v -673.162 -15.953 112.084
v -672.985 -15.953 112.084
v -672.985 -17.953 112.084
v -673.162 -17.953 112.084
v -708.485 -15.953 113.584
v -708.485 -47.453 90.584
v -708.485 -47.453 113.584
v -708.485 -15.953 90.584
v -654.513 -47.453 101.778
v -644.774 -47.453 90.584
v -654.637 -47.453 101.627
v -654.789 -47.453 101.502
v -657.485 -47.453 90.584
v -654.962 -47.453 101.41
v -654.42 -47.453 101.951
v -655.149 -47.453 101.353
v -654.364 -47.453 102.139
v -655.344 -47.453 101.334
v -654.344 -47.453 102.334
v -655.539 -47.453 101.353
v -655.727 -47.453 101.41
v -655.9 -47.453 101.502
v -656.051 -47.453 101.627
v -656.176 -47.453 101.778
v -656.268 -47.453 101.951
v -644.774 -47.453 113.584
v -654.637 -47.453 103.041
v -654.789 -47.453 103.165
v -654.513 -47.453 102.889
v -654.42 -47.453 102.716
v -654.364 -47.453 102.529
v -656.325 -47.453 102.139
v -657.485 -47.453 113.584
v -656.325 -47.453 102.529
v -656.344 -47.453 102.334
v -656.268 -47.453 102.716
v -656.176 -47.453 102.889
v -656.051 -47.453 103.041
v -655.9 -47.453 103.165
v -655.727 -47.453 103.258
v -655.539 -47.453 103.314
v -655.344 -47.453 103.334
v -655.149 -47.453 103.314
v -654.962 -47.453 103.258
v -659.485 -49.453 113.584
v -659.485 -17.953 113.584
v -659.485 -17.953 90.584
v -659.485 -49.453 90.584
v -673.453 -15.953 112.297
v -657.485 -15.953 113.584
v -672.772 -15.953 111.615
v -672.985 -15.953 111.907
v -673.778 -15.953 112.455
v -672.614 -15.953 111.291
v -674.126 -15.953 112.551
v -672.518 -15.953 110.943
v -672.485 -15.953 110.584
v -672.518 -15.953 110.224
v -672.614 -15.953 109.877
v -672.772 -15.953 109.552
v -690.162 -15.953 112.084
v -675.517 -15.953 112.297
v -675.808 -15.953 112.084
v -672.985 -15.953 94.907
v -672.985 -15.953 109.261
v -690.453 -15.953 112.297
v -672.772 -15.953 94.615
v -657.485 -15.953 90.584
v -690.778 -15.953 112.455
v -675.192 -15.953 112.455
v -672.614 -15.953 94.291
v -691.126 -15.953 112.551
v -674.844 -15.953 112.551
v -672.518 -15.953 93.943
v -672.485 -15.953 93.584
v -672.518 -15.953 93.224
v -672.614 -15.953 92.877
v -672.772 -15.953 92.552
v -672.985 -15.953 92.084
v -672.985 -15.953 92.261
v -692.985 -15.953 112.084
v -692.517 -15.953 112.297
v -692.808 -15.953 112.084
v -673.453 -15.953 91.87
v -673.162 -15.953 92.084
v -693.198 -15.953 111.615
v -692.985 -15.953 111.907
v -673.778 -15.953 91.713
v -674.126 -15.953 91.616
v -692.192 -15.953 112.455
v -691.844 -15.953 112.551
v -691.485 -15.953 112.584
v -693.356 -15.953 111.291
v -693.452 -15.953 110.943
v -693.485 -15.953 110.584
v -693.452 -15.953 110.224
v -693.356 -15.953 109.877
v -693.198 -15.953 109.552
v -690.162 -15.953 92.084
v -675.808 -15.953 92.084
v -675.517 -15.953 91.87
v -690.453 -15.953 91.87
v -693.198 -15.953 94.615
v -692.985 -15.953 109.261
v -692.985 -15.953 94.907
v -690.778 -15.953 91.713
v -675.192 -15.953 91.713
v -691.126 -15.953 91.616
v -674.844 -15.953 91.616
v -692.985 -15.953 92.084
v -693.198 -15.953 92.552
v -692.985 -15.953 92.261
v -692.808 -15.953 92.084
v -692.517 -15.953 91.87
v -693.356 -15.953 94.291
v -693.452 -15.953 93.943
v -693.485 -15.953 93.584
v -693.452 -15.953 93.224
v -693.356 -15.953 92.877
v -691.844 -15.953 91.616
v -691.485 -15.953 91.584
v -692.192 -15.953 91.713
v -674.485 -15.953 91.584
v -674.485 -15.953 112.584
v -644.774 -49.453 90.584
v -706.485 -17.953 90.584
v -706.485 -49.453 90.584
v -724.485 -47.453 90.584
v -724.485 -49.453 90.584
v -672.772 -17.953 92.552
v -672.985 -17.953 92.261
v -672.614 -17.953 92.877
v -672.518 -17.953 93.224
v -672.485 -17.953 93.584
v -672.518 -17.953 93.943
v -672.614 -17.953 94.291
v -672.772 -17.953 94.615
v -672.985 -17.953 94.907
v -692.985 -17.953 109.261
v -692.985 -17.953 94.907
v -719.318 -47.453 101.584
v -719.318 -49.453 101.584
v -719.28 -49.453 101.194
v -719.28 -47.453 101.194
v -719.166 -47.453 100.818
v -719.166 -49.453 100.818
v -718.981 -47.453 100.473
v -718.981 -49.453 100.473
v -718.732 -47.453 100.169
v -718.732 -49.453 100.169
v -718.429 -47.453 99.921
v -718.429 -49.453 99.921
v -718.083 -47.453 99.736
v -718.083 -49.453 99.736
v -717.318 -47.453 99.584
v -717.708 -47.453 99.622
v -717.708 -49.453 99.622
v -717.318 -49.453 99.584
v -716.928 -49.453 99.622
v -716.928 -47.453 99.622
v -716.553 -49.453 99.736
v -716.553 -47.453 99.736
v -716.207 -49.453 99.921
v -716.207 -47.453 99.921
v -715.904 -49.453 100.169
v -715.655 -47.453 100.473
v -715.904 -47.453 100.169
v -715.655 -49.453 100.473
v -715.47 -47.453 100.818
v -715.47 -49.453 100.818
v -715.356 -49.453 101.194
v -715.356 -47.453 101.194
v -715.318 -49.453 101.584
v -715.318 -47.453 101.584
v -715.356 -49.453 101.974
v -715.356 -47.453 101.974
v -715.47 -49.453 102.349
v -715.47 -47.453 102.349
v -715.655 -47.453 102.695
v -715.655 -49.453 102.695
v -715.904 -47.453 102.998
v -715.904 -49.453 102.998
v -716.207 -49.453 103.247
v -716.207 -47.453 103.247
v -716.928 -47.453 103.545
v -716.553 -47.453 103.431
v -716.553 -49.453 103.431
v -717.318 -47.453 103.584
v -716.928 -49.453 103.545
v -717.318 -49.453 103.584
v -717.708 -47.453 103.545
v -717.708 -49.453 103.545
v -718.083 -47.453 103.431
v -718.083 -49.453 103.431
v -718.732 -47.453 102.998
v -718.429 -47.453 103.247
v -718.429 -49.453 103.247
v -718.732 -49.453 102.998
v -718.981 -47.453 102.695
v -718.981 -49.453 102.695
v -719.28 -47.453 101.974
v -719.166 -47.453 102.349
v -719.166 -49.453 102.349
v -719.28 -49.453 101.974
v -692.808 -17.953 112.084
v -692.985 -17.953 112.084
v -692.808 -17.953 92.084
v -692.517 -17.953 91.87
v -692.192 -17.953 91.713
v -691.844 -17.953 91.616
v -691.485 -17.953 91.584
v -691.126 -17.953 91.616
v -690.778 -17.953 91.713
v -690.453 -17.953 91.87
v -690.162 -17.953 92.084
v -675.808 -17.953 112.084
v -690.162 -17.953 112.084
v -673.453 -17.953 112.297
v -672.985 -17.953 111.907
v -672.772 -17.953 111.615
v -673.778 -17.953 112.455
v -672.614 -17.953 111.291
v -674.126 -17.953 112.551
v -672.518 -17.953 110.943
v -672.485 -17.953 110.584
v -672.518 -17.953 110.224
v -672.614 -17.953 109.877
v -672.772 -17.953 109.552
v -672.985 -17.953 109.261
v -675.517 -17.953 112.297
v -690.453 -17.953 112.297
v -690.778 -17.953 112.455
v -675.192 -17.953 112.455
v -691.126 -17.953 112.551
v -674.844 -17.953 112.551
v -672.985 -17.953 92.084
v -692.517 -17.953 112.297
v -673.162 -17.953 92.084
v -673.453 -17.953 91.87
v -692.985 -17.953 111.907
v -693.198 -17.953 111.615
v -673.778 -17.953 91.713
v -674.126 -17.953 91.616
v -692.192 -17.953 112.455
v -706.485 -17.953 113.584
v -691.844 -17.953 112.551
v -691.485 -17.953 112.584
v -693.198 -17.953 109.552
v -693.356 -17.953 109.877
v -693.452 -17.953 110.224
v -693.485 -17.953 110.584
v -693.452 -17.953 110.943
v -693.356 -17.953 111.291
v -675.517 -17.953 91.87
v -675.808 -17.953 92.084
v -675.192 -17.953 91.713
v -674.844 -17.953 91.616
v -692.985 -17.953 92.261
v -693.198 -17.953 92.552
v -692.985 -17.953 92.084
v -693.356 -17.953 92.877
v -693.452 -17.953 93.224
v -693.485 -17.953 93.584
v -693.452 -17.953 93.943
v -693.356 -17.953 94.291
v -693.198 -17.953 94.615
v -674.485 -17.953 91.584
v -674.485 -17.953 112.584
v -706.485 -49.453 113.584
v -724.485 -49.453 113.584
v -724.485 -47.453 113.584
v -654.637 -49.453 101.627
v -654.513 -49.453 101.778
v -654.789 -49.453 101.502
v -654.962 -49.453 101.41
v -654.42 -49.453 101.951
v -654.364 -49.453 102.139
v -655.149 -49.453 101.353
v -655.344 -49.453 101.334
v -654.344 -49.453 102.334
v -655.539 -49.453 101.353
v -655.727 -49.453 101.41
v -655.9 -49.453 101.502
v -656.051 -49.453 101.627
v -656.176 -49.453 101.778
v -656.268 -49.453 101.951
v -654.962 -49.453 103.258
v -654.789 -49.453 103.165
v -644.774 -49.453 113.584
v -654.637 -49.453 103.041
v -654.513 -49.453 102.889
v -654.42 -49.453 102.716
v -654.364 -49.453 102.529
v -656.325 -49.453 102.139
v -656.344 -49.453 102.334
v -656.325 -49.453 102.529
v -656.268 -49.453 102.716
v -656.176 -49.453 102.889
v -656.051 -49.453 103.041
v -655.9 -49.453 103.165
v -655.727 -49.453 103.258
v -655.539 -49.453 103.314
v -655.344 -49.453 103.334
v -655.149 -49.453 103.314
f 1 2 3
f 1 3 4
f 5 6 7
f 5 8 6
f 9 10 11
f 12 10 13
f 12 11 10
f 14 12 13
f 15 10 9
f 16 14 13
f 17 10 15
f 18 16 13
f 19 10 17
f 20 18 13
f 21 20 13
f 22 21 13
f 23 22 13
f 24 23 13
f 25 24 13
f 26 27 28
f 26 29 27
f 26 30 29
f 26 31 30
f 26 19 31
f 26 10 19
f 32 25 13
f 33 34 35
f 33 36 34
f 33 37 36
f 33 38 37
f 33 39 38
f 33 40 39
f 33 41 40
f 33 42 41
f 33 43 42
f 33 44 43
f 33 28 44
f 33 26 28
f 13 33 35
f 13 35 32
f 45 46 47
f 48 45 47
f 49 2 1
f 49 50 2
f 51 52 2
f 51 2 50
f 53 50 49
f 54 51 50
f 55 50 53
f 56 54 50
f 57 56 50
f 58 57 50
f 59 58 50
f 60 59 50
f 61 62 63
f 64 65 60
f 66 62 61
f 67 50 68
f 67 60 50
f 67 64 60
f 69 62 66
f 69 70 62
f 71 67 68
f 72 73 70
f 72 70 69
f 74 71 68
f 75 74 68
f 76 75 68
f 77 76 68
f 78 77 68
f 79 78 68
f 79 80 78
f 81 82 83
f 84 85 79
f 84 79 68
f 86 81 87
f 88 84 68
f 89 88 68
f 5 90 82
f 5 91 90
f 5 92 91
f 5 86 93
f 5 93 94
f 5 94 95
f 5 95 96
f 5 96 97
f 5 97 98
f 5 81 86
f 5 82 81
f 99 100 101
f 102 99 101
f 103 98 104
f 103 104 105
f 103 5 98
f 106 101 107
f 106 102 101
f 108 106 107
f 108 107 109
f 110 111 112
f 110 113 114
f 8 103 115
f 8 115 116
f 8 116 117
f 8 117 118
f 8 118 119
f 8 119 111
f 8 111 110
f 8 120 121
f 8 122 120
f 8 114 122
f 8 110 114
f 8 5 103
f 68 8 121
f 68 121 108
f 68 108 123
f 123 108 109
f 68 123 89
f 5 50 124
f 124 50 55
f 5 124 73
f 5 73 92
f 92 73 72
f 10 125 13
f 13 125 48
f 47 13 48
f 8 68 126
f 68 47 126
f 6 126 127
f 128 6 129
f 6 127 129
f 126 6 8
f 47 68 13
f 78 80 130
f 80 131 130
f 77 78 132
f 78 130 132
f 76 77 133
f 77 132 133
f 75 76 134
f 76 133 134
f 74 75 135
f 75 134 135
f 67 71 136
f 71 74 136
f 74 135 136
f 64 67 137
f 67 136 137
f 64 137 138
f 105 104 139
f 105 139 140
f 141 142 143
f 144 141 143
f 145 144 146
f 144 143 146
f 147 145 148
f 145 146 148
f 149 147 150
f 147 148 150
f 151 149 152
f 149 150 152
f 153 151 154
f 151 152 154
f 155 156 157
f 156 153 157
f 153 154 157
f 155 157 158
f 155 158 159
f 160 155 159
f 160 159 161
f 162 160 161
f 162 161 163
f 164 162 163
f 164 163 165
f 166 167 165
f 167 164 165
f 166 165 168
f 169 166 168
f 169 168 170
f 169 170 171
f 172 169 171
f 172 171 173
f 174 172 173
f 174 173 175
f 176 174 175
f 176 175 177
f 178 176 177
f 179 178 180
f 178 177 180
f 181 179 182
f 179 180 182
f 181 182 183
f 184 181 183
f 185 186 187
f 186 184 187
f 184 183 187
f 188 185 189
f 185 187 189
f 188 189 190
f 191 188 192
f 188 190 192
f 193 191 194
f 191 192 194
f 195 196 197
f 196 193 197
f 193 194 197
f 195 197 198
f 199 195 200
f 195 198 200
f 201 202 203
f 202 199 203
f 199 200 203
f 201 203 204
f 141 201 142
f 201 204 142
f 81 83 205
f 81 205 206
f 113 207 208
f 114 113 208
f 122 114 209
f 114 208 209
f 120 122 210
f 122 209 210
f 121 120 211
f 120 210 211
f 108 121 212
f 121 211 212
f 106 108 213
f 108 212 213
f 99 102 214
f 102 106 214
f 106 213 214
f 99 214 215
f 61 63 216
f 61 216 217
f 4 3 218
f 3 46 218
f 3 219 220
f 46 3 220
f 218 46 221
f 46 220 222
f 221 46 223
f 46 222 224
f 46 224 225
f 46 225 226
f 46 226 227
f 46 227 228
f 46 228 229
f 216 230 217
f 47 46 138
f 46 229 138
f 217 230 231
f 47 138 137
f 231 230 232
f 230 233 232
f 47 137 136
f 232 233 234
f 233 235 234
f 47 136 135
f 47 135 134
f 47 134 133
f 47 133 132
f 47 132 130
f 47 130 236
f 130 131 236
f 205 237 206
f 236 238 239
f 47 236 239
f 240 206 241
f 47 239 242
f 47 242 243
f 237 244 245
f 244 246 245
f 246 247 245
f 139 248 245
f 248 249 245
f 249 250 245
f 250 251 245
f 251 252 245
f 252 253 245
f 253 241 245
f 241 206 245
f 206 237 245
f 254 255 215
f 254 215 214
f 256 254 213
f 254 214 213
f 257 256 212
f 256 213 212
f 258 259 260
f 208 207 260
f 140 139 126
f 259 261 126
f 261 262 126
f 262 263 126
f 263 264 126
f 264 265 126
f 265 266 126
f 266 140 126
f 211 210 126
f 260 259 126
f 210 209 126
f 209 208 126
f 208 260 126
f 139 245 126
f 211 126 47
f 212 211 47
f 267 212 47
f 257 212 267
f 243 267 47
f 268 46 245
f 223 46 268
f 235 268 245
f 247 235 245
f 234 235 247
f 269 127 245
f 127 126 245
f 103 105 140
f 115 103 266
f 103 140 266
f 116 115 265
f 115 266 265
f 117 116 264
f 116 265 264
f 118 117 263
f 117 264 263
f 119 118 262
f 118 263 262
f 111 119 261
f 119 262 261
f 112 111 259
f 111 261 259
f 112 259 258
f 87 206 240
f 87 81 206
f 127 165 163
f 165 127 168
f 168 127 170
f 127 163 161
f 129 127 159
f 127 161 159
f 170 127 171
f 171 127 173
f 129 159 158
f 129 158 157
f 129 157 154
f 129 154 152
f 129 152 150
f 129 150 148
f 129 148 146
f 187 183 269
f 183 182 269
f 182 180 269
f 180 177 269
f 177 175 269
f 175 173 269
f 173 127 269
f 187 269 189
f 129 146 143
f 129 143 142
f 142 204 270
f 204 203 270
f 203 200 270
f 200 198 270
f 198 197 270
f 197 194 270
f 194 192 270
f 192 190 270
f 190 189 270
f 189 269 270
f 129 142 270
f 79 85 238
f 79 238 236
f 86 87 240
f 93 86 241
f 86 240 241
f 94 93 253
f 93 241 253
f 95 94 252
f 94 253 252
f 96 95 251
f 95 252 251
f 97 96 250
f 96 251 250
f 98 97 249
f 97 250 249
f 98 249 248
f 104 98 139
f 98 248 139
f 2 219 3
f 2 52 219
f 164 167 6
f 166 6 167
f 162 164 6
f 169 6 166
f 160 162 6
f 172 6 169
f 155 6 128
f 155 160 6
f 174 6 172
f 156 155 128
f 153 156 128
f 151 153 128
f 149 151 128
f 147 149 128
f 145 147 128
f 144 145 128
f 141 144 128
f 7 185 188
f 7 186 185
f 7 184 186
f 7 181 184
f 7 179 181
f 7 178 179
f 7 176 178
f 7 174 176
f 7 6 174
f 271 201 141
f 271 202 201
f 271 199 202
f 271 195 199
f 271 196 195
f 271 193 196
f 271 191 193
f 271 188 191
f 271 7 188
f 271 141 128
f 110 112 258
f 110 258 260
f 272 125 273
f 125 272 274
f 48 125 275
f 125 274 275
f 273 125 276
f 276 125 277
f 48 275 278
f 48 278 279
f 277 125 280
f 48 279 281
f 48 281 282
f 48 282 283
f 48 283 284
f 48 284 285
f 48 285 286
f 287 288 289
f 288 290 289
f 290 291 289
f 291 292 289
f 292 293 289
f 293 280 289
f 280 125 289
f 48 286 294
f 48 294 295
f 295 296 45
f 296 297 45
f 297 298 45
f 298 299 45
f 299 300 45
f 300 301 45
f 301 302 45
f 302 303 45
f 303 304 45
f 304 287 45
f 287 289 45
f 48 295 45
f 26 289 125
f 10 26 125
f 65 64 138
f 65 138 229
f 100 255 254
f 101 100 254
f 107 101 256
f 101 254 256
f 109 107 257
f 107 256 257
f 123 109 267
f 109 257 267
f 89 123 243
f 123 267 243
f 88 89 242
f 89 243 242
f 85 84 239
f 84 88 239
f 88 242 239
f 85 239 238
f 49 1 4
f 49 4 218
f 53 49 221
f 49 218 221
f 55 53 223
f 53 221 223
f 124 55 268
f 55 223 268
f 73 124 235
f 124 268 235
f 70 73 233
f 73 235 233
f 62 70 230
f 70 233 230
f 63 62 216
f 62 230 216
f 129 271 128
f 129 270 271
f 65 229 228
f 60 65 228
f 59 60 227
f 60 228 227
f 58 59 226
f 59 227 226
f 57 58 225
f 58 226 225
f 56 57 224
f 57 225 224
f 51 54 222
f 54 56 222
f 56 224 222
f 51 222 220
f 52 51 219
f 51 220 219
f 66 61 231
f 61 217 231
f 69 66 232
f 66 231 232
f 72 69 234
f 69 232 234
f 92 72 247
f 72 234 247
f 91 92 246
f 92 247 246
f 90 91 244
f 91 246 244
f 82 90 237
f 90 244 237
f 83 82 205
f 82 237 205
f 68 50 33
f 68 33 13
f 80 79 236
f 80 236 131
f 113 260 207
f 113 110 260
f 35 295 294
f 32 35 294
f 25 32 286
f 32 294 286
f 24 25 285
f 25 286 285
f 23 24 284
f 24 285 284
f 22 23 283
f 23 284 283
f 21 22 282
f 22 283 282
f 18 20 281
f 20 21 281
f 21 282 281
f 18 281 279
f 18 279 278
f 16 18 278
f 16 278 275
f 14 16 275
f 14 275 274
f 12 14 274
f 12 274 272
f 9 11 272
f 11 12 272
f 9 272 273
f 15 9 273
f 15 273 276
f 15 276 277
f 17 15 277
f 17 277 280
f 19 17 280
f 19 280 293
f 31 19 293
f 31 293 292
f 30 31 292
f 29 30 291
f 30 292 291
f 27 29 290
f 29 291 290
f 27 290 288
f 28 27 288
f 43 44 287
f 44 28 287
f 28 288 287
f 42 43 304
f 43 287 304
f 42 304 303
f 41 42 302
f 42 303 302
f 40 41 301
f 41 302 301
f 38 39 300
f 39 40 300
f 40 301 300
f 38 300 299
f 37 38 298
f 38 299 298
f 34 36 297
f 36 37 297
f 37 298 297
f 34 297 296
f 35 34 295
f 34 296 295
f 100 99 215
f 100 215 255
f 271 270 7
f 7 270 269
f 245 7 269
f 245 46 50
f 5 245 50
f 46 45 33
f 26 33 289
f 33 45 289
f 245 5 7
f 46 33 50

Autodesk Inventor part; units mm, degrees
ref_plane "YZ Plane" through (0, 0, 0) normal (1, 0, 0) x (0, 1, 0)
ref_plane "XZ Plane" through (0, 0, 0) normal (0, 1, 0) x (-1, 0, 0)
ref_plane "XY Plane" through (0, 0, 0) normal (0, 0, 1) x (1, 0, 0)
ref_plane "РабПлоскость2" through (-682.985, -17.9529, 102.0837) normal (0, 1, 0) x (-1, 0, 0)
ref_plane "РабПлоскость3" through (1272.2614, -51.4529, 81.5837) normal (0, 0, 1) x (1, 0, 0)
sketch "Эскиз1" plane through (1272.2614, -51.4529, 81.5837) normal (0, 0, 1) x (1, 0, 0)
  point P0 (-1272.2614, 51.4529)
sketch "Эскиз2" plane through (-682.985, -17.9529, 102.0837) normal (0, 1, 0) x (-1, 0, 0)
  line L0 (-11.5, -11.5) -> (11.5, -11.5)
  line L1 (11.5, -11.5) -> (11.5, 11.5)
  line L2 (11.5, 11.5) -> (-11.5, 11.5)
  line L3 (-11.5, 11.5) -> (-11.5, -11.5)
  line L4 (-11.5, -11.5) -> (11.5, 11.5) construction
  line L5 (11.5, -11.5) -> (-11.5, 11.5) construction
  circle A0 centre (8.5, 8.5) radius 2
  circle A1 centre (8.5, -8.5) radius 2
  line L6 (0, 20.5912) -> (0, -22.1181)
  circle A2 centre (-8.5, 8.5) radius 2
  circle A3 centre (-8.5, -8.5) radius 2
  point P0 (-682.985, -102.0837)
  point P1 (0, 0)
  point P2 (0, 0)
  dimension "d0" = 23
  dimension "d1" = 23
  dimension "d2" = 4
  dimension "d5" = 3
  dimension "d6" = 3
  dimension "d7" = 4
  dimension "d8" = 3
  dimension "d9" = 3
extrude "Выдавливание1" add sketch "Эскиз2" along normal blind 2
sketch "Эскиз3" plane through (-694.485, -17.9529, 90.5837) normal (-1, 0, 0) x (0, 0, 1)
  line L0 (23, 0) -> (0, 0) projected
  line L1 (23, 2) -> (0, 2)
  line L2 (0, 2) -> (0, 0)
  line L3 (0, 0) -> (23, 0)
  line L4 (23, 0) -> (23, 2)
  point P0 (-90.5837, 17.9529)
extrude "Выдавливание2" add sketch "Эскиз3" along normal blind 12
sketch "Эскиз6" plane through (-706.485, -17.9529, 90.5837) normal (-1, 0, 0) x (0, 0, 1)
  line L0 (23, 2) -> (0, 2)
  line L1 (0, 2) -> (0, -31.5)
  line L2 (0, -31.5) -> (23, -31.5)
  line L3 (23, -31.5) -> (23, 2)
  point P0 (-90.5837, 17.9529)
  dimension "d14" = 33.5
extrude "Выдавливание3" add sketch "Эскиз6" along normal blind 2
sketch "Эскиз7" plane through (-671.485, -17.9529, 113.5837) normal (1, 0, 0) x (0, 0, -1)
  point P0 (113.5837, 17.9529)
sketch "Эскиз8" plane through (-682.985, -17.9529, 102.0837) normal (0, 1, 0) x (-1, 0, 0)
  point P0 (-682.985, -102.0837)
sketch "Эскиз9" plane through (-671.485, -17.9529, 113.5837) normal (1, 0, 0) x (0, 0, -1)
  line L0 (23, 0) -> (23, 2) projected
  line L1 (23, 2) -> (0, 2)
  line L2 (0, 2) -> (0, 0)
  line L3 (0, 0) -> (23, 0)
  line L4 (23, 0) -> (23, 2)
  point P0 (113.5837, 17.9529)
extrude "Выдавливание4" add sketch "Эскиз9" along normal blind 12
sketch "Эскиз10" plane through (-659.485, -17.9529, 113.5837) normal (1, 0, 0) x (0, 0, -1)
  line L0 (0, 2) -> (23, 2) projected
  line L1 (23, -31.5) -> (0, -31.5) projected
  line L2 (23, 2) -> (0, 2)
  line L3 (0, 2) -> (0, -31.5)
  line L4 (0, -31.5) -> (23, -31.5)
  line L5 (23, -31.5) -> (23, 2)
  point P0 (113.5837, 17.9529)
  point P1 (23, -31.5)
extrude "Выдавливание5" add sketch "Эскиз10" along normal blind 2
sketch "Эскиз11" plane through (-682.985, -15.9529, 102.0837) normal (0, 1, 0) x (1, 0, 0)
  line L0 (6.5, -6.5) -> (-6.5, -6.5)
  line L1 (-6.5, -6.5) -> (-6.5, 6.5)
  line L2 (-6.5, 6.5) -> (6.5, 6.5)
  line L3 (6.5, 6.5) -> (6.5, -6.5)
  line L4 (6.5, -6.5) -> (-6.5, 6.5) construction
  line L5 (-6.5, -6.5) -> (6.5, 6.5) construction
  point P0 (682.985, 102.0837)
  point P1 (0, 0)
  point P2 (0, 0)
  dimension "d21" = 13
  dimension "d22" = 13
extrude "Выдавливание6" cut sketch "Эскиз11" against normal blind 10
ref_plane "РабПлоскость4" through (-602.7943, -49.4529, 186.5837) normal (0, 1, 0) x (-1, 0, 0)
sketch "Эскиз12" plane through (-602.7943, -49.4529, 186.5837) normal (0, 1, 0) x (-1, 0, 0)
  circle A0 centre (114.5237, -85) radius 2 projected
  circle A1 centre (62.5237, -85) radius 2 projected
  line L0 (56.6907, -73) -> (56.6907, -96) projected
  line L1 (56.6907, -73) -> (121.6907, -73)
  line L2 (121.6907, -73) -> (121.6907, -96)
  line L3 (121.6907, -96) -> (56.6907, -96)
  line L4 (56.6907, -96) -> (56.6907, -73)
  line L5 (105.6907, -73) -> (105.6907, -96) projected
  point P0 (-602.7943, -186.5837)
  dimension "d25" = 65
extrude "Выдавливание8" add sketch "Эскиз12" along normal blind 2 contours L1 L2 L3 L5
ref_plane "РабПлоскость5" through (-602.7943, -49.4529, 186.5837) normal (0, 1, 0) x (-1, 0, 0)
sketch "Эскиз13" plane through (-602.7943, -49.4529, 186.5837) normal (0, 1, 0) x (-1, 0, 0)
  line L0 (54.6907, -96) -> (54.6907, -73) projected
  line L1 (54.6907, -73) -> (41.9796, -73)
  line L2 (41.9796, -73) -> (41.9796, -96)
  line L3 (41.9796, -96) -> (54.6907, -96)
  line L4 (54.6907, -96) -> (54.6907, -73)
  circle A0 centre (52.55, -84.25) radius 1 projected
  point P0 (-602.7943, -186.5837)
extrude "Выдавливание9" add sketch "Эскиз13" along normal blind 2
sketch "Эскиз14" plane through (-682.985, -15.9529, 102.0837) normal (0, 1, 0) x (1, 0, 0)
  line L0 (10, -10) -> (-10, -10)
  line L1 (-10, -10) -> (-10, 10)
  line L2 (-10, 10) -> (10, 10)
  line L3 (10, 10) -> (10, -10)
  line L4 (10, -10) -> (-10, 10) construction
  line L5 (-10, -10) -> (10, 10) construction
  point P0 (682.985, 102.0837)
  point P1 (0, 0)
  point P2 (0, 0)
  dimension "d32" = 20
  dimension "d33" = 20
extrude "Выдавливание10" cut sketch "Эскиз14" against normal blind 10
properties part number "деталь крепление энкодера"
